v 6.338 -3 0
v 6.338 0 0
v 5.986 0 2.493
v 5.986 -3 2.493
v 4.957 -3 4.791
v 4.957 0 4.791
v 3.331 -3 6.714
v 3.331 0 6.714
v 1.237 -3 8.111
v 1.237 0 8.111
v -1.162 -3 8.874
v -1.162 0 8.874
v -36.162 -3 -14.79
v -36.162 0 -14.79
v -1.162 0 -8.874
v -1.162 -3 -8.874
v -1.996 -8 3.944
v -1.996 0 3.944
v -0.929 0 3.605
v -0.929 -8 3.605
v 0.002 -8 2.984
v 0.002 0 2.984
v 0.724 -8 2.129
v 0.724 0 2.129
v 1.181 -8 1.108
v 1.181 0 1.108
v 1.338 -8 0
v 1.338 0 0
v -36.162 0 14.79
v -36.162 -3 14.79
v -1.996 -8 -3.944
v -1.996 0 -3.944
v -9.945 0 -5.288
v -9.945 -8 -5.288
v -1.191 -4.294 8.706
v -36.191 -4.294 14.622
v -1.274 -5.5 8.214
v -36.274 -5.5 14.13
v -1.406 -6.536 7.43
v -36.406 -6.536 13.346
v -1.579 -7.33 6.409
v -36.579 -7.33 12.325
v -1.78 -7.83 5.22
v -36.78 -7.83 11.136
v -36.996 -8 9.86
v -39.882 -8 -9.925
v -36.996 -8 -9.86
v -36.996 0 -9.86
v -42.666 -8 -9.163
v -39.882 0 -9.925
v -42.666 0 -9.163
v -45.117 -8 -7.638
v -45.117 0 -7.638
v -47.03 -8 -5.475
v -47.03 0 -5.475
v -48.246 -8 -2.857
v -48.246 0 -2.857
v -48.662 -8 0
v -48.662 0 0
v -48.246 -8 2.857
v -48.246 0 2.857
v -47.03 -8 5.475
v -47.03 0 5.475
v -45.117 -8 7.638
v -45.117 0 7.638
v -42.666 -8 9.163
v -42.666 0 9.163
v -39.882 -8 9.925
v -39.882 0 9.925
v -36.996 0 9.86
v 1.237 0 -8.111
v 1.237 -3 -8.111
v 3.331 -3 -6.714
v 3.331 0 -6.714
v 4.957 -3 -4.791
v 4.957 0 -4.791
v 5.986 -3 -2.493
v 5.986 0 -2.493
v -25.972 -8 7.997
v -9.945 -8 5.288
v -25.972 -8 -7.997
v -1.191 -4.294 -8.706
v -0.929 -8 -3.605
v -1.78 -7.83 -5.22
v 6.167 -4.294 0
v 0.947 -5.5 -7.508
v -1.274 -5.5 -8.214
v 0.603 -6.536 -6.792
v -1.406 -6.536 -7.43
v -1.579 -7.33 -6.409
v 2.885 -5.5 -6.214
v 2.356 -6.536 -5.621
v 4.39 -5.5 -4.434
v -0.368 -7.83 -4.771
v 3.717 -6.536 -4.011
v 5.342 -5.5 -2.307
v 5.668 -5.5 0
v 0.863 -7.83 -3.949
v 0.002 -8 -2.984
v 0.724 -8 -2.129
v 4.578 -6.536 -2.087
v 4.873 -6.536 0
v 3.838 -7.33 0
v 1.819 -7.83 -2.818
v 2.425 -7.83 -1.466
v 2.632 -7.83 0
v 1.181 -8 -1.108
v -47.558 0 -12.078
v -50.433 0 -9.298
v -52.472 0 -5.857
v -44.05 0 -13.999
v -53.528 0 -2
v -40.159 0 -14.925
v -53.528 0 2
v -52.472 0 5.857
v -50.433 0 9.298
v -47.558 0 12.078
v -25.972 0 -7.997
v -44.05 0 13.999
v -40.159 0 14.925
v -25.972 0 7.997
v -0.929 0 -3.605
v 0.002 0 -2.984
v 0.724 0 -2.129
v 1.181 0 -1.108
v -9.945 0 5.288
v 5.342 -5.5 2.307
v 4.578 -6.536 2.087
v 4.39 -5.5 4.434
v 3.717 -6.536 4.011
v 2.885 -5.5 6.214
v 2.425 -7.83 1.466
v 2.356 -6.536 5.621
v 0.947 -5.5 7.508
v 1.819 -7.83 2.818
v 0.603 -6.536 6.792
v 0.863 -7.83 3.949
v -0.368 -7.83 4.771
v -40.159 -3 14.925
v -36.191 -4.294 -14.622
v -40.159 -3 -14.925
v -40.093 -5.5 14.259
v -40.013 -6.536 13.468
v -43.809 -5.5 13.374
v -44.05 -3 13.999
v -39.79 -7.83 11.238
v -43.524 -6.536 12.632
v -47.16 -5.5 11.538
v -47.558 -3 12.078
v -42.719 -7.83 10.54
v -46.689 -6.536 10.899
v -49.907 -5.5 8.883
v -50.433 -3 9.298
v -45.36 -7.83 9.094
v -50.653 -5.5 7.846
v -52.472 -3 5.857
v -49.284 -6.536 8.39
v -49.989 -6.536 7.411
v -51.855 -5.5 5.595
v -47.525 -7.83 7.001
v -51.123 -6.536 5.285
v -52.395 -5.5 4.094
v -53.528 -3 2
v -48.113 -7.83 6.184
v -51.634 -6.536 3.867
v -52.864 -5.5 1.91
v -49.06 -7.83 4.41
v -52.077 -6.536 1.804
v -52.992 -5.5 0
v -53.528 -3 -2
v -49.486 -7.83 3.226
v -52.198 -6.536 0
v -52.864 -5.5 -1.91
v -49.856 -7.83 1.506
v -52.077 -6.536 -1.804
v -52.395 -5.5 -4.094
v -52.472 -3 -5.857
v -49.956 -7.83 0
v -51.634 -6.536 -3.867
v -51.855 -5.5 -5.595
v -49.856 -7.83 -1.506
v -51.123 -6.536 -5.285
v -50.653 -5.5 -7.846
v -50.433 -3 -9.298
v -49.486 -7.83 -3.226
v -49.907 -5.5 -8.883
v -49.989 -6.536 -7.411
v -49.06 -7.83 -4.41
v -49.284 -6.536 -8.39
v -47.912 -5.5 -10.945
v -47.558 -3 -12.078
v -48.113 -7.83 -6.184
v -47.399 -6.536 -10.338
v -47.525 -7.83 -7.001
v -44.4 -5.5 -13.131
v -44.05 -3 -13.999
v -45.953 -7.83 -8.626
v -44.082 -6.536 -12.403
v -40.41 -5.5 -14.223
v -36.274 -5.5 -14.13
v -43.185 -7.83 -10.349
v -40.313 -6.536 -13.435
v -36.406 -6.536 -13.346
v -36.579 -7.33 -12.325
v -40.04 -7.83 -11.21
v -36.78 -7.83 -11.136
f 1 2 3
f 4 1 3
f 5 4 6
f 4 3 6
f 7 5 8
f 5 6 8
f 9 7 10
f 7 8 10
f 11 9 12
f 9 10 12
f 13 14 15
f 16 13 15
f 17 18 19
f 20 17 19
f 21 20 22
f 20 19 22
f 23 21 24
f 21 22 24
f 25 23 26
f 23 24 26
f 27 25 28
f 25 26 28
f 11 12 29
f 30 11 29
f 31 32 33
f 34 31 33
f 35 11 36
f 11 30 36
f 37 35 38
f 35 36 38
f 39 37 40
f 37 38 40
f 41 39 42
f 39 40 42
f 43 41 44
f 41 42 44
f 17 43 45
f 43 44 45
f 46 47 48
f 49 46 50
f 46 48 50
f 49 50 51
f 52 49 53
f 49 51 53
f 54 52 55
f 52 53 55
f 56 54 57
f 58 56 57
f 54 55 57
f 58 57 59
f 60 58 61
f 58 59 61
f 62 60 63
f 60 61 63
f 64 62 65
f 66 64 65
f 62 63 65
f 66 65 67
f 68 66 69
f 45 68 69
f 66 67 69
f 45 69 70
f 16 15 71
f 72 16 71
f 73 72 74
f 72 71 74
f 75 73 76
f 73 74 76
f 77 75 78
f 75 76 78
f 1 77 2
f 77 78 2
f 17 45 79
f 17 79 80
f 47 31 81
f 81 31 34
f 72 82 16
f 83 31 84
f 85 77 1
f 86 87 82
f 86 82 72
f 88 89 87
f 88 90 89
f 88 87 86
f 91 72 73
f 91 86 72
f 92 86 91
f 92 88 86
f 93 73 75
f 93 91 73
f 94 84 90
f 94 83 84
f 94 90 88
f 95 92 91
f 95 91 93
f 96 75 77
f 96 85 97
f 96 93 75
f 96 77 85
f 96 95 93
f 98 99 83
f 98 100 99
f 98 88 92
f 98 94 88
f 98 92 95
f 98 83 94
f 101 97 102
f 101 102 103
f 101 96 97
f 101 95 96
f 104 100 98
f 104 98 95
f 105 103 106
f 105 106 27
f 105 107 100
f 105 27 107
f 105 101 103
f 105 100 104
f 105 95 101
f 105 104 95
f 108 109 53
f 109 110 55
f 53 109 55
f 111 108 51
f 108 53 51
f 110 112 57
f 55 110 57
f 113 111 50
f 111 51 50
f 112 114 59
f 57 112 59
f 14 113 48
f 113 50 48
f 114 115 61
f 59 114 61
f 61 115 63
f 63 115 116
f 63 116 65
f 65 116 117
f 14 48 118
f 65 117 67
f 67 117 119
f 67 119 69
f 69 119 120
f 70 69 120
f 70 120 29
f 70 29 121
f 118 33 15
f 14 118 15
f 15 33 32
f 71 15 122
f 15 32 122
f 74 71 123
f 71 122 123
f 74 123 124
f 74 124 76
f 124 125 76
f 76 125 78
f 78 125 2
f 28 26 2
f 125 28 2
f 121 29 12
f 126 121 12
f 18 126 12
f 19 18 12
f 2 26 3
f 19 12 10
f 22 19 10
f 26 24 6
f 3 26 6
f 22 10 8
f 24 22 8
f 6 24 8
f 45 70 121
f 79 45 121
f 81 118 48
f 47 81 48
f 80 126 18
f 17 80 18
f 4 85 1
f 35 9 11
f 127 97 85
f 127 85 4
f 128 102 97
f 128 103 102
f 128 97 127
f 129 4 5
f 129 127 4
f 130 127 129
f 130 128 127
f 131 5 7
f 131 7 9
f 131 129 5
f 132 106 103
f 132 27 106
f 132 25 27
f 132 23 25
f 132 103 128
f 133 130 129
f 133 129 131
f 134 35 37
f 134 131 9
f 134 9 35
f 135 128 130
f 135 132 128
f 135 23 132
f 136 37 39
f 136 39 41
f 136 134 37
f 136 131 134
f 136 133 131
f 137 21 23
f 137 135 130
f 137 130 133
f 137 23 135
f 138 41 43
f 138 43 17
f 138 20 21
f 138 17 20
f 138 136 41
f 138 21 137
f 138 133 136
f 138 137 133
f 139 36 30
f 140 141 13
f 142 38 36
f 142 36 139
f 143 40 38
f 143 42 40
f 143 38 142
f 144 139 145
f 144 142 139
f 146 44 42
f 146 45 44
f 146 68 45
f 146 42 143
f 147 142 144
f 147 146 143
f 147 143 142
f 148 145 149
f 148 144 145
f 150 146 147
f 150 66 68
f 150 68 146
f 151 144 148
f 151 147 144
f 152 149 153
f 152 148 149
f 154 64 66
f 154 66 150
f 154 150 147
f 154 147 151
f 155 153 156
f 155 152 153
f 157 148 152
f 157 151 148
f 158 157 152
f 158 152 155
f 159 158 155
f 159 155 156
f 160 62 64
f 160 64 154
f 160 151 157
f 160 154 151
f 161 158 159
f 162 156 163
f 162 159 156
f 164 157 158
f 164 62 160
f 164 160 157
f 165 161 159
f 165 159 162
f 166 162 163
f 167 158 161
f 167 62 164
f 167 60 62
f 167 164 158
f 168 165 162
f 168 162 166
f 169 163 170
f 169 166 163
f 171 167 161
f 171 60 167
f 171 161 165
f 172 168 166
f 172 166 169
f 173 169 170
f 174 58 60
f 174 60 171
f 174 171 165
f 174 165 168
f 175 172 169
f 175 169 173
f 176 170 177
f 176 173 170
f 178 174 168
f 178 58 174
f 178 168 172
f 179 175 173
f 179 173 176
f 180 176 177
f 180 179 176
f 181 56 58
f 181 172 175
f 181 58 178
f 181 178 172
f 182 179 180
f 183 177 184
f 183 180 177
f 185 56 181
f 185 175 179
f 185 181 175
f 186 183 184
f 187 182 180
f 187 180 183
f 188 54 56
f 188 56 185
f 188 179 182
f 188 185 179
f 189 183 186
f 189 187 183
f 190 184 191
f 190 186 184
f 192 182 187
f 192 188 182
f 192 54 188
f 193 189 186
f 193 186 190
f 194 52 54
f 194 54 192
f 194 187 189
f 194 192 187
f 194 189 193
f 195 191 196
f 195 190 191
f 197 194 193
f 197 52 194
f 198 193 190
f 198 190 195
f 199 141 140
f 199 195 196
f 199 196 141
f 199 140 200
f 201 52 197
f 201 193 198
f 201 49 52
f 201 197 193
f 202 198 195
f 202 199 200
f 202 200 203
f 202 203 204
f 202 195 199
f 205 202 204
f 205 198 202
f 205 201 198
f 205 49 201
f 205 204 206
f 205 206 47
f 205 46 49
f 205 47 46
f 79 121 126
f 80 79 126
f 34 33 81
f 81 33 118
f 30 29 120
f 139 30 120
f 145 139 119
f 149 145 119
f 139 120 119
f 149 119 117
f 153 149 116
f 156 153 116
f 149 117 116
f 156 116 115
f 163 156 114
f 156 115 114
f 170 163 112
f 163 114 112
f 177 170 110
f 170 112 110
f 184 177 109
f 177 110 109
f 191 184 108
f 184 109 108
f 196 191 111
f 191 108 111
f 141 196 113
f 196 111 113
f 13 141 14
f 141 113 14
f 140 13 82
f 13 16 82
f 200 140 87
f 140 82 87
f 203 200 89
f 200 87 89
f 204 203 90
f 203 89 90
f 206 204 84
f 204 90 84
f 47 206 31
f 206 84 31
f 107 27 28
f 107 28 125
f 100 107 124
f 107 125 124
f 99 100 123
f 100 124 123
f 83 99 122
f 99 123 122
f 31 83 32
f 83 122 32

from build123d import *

# Parameters (mm, degrees)
F1_DEPTH = 8
F2_R     = 4.99999


# Not quite as in the source:
# - a fillet or chamfer is up to 0.001 mm smaller than in the source, because OpenCascade refuses the exact size


with BuildPart() as f1:
    # F0 (on Front) → F1 (new body)
    with BuildSketch(Plane.XZ):
        with BuildLine():
            ThreePointArc((-36.9956071563, -9.8601329718), (-48.6622738229, 0), (-36.9956071563, 9.8601329718))
            Line((-36.9956071563, 9.8601329718), (-25.9716433602, 7.9967429906))
            ThreePointArc((-25.9716433602, 7.9967429906), (-30.3420228558, 12.4809223955), (-36.1622738229, 14.7901994577))
            ThreePointArc((-36.1622738229, 14.7901994577), (-53.6622738229, 0), (-36.1622738229, -14.7901994577))
            ThreePointArc((-36.1622738229, -14.7901994577), (-30.3420228558, -12.4809223955), (-25.9716433602, -7.9967429906))
            Line((-25.9716433602, -7.9967429906), (-36.9956071563, -9.8601329718))
        make_face()
        with BuildLine():
            ThreePointArc((-36.1622738229, 14.7901994577), (-30.3420228558, 12.4809223955), (-25.9716433602, 7.9967429906))
            Line((-25.9716433602, 7.9967429906), (-9.9451005014, 5.2877628134))
            ThreePointArc((-9.9451005014, 5.2877628134), (-6.064590678, 8.3321209795), (-1.1622738229, 8.8741196746))
            Line((-1.1622738229, 8.8741196746), (-36.1622738229, 14.7901994577))
        make_face()
        with BuildLine():
            Line((-9.9451005014, -5.2877628134), (-25.9716433602, -7.9967429906))
            ThreePointArc((-25.9716433602, -7.9967429906), (-30.3420228558, -12.4809223955), (-36.1622738229, -14.7901994577))
            Line((-36.1622738229, -14.7901994577), (-1.1622738229, -8.8741196746))
            ThreePointArc((-1.1622738229, -8.8741196746), (-6.064590678, -8.3321209795), (-9.9451005014, -5.2877628134))
        make_face()
        with BuildLine():
            ThreePointArc((-1.1622738229, 8.8741196746), (-6.064590678, 8.3321209795), (-9.9451005014, 5.2877628134))
            Line((-9.9451005014, 5.2877628134), (-1.9956071563, 3.9440531887))
            ThreePointArc((-1.9956071563, 3.9440531887), (0.3927766404, 2.5819888975), (1.3377261771, 0))
            ThreePointArc((1.3377261771, 0), (0.3927766404, -2.5819888975), (-1.9956071563, -3.9440531887))
            Line((-1.9956071563, -3.9440531887), (-9.9451005014, -5.2877628134))
            ThreePointArc((-9.9451005014, -5.2877628134), (-6.064590678, -8.3321209795), (-1.1622738229, -8.8741196746))
            ThreePointArc((-1.1622738229, -8.8741196746), (4.2115897195, -5.8094750193), (6.3377261771, 0))
            ThreePointArc((6.3377261771, 0), (4.2115897195, 5.8094750193), (-1.1622738229, 8.8741196746))
        make_face()
    extrude(amount=F1_DEPTH)

    # F2 (radius 5 in the source; OpenCascade refuses exactly that, so slightly less here)
    f2_edges = [f1.edges().sort_by_distance(p)[0] for p in [
        (-18.662274, -8, 11.83216),
    ]]
    fillet(f2_edges, radius=F2_R)


solid = f1.part
